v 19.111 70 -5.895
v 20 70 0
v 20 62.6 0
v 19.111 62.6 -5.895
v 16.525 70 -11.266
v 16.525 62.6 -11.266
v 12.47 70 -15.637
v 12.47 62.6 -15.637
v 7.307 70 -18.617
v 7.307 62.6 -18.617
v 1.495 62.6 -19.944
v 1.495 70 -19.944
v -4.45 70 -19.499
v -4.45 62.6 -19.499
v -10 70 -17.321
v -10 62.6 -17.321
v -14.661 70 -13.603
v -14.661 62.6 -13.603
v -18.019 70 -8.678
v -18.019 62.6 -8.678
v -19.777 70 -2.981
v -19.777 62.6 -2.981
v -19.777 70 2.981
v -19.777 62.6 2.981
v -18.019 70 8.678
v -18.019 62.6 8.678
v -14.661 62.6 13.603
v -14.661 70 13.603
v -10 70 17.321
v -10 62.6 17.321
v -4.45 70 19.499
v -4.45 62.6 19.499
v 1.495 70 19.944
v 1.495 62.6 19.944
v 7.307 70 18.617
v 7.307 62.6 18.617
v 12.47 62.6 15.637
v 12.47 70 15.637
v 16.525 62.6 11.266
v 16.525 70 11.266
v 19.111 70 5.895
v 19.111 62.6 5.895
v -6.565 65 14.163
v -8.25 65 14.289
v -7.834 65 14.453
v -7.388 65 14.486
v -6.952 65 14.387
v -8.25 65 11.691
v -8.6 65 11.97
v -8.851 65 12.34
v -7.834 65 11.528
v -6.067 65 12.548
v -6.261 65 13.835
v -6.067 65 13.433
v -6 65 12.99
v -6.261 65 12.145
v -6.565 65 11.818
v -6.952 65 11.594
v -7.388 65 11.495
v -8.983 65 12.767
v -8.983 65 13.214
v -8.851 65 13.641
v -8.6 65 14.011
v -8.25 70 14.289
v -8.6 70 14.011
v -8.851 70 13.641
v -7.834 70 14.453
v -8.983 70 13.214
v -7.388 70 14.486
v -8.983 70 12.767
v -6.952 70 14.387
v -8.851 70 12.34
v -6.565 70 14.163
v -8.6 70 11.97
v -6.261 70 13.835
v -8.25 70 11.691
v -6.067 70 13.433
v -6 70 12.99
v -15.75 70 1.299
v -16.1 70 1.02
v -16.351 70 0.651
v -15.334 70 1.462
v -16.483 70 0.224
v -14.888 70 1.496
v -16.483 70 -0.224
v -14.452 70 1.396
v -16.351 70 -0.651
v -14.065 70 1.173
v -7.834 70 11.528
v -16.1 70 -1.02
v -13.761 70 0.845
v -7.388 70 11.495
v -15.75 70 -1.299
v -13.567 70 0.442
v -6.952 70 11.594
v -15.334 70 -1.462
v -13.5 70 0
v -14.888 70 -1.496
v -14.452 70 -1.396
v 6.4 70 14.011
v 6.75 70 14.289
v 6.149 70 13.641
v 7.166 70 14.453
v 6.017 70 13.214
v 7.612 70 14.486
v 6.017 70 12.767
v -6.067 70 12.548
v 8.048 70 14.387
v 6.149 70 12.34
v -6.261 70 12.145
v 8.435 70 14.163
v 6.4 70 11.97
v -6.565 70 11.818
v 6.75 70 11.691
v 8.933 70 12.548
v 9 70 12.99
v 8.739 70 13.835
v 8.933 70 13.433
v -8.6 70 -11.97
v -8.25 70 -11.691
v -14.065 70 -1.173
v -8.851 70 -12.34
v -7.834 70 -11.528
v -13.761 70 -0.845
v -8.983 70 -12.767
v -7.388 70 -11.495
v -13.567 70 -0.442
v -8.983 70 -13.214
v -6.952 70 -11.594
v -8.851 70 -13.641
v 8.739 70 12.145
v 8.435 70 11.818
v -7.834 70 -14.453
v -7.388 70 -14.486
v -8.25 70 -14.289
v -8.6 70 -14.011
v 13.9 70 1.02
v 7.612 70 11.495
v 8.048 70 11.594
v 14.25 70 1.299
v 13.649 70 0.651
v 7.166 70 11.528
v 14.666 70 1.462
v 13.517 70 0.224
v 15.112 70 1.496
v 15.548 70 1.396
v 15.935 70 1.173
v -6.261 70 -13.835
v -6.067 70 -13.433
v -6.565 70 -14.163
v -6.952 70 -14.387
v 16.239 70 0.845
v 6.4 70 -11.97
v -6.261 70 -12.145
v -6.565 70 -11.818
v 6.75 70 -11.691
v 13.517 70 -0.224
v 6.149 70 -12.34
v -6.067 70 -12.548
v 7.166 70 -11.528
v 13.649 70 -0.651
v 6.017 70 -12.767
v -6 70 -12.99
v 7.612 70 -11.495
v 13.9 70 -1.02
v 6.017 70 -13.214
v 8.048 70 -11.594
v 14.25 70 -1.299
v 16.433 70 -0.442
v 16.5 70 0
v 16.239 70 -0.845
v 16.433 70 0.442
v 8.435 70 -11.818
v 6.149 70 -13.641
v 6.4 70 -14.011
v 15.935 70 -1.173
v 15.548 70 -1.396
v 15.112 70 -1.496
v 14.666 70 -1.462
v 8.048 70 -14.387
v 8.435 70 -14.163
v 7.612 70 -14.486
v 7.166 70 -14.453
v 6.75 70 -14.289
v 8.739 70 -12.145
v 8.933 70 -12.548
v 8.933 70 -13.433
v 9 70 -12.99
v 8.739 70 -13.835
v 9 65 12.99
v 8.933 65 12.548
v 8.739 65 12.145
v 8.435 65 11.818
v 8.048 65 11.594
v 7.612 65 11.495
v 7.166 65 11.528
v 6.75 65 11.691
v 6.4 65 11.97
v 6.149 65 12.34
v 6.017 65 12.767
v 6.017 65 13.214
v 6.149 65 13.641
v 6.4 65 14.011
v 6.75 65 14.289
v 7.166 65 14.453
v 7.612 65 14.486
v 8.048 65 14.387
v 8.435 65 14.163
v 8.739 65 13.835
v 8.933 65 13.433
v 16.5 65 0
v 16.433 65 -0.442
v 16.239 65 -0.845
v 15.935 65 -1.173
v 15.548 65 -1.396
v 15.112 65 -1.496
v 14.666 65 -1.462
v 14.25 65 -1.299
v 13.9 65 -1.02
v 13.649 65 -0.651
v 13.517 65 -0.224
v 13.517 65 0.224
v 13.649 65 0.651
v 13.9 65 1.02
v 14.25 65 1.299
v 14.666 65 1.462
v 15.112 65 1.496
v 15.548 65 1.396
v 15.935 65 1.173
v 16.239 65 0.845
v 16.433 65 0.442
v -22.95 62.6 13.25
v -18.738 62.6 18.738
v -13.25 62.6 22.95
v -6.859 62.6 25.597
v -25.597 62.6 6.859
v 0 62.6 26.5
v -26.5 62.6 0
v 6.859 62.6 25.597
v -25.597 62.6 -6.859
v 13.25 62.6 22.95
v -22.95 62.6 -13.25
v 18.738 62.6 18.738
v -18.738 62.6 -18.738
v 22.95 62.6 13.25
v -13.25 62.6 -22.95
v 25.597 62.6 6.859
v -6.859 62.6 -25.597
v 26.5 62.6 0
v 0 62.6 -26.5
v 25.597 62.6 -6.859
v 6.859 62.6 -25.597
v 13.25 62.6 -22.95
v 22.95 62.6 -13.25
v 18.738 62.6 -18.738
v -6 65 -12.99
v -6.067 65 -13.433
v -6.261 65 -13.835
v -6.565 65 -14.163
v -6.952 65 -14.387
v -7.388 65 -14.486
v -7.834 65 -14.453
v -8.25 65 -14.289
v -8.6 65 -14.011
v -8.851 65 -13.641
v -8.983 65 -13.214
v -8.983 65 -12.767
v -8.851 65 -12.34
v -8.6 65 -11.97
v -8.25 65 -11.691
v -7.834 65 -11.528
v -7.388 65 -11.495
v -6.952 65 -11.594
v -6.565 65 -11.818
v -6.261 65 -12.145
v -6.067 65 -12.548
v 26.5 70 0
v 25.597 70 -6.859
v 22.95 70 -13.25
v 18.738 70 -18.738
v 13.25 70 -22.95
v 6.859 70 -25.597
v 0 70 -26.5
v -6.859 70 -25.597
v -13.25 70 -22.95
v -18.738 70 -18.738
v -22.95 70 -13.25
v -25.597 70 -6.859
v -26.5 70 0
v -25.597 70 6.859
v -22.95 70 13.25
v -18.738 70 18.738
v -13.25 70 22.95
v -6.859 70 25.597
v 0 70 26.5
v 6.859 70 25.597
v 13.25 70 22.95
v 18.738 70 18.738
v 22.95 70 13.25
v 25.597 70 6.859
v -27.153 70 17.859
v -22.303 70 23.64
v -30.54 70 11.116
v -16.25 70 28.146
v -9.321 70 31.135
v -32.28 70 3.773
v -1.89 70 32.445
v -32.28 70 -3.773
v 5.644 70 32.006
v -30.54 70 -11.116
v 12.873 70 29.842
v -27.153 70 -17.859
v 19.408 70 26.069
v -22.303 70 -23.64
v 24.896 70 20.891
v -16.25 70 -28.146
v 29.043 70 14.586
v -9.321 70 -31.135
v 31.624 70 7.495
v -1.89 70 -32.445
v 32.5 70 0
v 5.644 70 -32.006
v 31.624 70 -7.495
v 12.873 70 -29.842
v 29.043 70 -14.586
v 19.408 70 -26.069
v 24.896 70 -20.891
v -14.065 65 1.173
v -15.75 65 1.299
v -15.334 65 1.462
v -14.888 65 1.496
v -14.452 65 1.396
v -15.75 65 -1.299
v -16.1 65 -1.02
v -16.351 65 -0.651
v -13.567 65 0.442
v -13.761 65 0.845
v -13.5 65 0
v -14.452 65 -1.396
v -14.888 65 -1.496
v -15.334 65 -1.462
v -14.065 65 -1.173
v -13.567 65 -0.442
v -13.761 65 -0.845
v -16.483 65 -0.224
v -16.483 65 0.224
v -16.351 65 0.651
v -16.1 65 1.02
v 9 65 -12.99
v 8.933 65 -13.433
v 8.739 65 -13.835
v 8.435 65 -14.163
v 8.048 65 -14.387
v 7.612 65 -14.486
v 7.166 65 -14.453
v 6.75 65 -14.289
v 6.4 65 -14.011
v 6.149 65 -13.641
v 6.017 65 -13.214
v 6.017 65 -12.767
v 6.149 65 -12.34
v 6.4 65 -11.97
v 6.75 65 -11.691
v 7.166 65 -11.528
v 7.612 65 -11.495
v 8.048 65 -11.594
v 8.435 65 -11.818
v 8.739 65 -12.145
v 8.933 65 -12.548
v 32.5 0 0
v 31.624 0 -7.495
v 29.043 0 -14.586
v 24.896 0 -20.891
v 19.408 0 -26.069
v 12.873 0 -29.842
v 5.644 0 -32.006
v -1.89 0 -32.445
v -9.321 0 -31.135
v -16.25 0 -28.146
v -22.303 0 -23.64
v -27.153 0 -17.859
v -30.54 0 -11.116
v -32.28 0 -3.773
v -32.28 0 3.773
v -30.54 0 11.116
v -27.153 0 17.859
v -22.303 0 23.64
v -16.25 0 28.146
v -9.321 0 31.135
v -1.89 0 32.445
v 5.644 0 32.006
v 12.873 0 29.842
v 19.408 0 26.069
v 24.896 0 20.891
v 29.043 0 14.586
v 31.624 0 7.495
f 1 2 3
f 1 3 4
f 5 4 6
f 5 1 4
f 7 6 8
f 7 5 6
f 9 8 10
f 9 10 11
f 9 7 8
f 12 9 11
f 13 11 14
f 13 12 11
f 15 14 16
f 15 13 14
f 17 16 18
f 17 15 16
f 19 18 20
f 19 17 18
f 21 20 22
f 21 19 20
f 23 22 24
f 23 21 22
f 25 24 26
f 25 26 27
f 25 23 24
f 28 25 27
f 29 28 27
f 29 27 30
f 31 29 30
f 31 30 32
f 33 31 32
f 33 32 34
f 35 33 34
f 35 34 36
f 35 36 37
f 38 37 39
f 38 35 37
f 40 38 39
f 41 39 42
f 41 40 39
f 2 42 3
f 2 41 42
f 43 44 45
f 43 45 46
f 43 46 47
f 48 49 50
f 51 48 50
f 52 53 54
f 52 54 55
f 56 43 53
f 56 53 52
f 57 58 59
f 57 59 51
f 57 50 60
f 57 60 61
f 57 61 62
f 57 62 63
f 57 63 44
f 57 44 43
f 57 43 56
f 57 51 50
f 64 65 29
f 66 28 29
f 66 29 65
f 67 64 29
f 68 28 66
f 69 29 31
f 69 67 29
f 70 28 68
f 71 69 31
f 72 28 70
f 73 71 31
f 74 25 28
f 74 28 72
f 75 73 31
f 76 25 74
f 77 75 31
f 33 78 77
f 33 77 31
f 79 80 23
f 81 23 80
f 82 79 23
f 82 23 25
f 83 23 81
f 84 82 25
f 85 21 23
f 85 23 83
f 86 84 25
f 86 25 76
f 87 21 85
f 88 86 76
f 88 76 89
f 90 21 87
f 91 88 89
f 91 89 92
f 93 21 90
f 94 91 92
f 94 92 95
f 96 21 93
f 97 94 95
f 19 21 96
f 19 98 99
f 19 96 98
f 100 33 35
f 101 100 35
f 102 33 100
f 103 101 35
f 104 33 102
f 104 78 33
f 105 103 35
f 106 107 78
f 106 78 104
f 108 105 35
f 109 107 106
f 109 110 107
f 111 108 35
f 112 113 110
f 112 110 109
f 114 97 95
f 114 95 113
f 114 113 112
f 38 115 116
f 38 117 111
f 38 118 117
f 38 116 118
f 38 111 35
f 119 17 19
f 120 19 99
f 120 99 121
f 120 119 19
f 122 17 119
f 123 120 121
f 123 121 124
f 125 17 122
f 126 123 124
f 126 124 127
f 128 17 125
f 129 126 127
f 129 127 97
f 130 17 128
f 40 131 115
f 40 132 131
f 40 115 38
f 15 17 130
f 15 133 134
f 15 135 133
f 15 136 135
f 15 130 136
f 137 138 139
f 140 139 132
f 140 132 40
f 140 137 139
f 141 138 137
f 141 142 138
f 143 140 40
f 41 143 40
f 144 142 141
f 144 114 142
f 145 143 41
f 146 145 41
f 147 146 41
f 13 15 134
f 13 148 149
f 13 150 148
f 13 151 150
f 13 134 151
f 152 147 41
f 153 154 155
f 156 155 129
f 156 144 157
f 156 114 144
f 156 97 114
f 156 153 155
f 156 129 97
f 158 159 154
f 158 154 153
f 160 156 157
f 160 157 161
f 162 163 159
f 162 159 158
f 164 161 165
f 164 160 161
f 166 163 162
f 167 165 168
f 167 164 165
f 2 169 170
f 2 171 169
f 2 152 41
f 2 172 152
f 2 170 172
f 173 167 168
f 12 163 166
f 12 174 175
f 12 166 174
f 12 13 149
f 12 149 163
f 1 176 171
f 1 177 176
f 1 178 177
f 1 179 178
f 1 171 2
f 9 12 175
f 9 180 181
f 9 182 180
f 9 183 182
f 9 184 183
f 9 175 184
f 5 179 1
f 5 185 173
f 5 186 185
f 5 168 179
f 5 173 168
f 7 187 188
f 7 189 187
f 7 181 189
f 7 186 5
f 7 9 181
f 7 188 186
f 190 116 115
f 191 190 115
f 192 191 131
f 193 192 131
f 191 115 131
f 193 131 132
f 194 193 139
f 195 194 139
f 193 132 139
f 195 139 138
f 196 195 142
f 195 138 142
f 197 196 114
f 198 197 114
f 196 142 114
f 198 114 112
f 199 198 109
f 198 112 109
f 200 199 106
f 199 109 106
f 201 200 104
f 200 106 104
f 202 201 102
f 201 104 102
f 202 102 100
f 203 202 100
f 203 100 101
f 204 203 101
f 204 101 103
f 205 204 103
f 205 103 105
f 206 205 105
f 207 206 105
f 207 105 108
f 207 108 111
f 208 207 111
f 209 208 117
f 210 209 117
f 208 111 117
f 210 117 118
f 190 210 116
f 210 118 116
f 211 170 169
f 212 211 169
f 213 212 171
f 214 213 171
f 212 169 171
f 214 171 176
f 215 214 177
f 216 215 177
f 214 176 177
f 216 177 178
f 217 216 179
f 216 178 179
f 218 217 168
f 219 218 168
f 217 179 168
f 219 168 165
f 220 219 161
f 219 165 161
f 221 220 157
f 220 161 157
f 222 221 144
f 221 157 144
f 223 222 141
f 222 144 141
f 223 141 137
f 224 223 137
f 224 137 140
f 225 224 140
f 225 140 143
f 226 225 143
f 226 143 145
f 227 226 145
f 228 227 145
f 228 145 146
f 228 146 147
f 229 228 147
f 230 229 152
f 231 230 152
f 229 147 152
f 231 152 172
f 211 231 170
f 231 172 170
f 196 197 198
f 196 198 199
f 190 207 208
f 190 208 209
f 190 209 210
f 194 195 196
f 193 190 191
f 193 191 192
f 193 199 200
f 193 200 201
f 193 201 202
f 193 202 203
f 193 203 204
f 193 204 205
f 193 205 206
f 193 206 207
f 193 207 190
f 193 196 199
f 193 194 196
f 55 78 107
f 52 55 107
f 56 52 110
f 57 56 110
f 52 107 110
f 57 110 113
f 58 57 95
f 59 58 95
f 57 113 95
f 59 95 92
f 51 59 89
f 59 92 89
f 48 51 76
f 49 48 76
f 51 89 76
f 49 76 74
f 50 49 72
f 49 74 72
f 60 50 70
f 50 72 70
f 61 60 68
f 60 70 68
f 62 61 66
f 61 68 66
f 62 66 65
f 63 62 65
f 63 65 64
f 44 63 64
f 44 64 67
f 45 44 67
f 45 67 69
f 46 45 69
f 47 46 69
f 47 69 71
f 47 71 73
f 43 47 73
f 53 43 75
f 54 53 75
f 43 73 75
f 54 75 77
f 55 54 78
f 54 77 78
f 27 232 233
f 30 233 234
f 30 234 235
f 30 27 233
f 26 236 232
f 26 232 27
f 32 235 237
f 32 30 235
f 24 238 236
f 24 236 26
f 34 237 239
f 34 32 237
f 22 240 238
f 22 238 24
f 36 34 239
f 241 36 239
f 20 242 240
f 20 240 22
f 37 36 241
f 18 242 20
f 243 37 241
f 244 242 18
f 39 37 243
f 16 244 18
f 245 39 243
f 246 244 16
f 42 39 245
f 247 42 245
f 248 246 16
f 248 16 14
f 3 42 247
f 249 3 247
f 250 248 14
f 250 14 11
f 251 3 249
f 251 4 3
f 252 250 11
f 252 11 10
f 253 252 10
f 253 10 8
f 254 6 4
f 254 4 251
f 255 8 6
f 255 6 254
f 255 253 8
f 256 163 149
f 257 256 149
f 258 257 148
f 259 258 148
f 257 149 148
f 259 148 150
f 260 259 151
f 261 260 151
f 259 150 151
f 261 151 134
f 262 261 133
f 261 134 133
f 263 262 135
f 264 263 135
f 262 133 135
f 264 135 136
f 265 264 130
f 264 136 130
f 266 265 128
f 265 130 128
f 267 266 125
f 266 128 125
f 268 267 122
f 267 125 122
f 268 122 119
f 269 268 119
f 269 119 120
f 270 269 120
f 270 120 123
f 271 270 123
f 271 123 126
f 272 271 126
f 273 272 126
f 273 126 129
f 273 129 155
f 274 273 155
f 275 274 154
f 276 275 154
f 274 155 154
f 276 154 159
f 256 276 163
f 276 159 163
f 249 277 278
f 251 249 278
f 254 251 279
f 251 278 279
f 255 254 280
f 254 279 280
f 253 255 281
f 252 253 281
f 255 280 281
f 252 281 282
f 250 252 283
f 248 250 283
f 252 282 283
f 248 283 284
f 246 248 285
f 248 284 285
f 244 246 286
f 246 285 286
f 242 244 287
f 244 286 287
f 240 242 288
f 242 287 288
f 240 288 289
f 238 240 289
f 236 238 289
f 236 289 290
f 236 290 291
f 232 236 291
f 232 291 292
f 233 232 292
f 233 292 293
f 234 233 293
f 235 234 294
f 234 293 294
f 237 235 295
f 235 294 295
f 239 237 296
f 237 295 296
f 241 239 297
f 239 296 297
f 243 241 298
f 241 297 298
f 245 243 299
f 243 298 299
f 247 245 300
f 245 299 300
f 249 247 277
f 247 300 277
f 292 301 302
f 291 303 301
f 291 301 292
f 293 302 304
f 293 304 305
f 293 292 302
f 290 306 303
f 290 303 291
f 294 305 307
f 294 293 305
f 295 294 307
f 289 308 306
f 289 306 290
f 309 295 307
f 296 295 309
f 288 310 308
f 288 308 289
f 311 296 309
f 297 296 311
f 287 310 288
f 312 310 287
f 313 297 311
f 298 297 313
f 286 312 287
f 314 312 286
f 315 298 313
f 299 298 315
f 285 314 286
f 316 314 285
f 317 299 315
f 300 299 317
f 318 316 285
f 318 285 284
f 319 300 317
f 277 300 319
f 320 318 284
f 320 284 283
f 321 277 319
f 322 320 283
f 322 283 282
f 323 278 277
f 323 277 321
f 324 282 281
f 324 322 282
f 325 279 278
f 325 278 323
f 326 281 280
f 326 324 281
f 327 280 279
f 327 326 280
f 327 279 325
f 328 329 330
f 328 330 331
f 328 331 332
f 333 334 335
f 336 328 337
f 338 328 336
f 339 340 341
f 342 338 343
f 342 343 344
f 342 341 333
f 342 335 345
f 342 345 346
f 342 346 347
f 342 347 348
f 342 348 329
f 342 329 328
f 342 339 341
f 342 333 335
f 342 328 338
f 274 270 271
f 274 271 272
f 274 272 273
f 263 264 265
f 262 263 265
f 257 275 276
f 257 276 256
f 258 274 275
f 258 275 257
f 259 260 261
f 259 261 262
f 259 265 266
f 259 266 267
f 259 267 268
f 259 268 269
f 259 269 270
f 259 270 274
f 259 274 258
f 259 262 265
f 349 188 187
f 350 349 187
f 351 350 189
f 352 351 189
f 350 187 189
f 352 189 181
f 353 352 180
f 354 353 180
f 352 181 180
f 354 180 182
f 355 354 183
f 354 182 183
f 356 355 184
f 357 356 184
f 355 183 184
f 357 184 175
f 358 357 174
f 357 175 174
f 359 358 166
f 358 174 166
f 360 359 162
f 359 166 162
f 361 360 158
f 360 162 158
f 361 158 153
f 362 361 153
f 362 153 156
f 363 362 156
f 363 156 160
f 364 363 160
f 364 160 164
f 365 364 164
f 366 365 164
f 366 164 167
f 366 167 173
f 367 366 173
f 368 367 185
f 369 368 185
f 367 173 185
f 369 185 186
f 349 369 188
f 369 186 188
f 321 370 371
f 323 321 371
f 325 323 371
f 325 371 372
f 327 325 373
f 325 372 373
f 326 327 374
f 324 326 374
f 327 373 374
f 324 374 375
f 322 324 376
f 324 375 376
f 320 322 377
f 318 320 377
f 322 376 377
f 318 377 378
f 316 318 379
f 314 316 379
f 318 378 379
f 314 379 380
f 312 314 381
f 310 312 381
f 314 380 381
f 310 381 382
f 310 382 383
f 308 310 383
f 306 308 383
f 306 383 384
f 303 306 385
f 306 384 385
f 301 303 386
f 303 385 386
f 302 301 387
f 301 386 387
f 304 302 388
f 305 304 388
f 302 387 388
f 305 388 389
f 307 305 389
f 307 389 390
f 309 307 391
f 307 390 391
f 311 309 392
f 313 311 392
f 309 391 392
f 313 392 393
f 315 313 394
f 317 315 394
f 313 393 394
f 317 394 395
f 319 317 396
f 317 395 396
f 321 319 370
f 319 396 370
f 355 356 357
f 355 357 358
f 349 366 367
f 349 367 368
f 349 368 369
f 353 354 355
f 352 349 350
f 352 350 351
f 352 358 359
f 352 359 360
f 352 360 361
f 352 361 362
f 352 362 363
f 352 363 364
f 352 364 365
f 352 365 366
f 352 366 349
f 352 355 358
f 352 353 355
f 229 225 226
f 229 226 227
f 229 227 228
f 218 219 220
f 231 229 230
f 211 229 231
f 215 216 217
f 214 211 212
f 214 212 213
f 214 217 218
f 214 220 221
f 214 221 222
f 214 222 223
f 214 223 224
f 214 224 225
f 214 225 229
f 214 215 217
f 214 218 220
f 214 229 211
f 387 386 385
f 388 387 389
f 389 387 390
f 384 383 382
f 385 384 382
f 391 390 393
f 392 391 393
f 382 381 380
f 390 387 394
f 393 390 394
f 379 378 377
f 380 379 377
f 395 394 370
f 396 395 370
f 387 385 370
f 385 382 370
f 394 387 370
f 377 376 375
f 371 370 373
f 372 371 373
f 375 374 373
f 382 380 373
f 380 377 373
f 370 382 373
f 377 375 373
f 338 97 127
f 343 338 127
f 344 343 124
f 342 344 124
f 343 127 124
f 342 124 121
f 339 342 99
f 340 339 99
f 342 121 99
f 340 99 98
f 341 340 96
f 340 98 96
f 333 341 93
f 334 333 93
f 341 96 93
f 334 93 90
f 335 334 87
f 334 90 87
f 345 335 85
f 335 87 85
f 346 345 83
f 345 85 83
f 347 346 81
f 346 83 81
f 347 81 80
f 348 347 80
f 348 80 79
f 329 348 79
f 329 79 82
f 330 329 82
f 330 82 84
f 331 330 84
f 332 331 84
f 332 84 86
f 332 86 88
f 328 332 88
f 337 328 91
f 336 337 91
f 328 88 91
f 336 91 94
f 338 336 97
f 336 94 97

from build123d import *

# Parameters (mm, degrees)
CROQUIS1_R              = 32.5
SALIENTE_EXTRUIR1_DEPTH = 70
CROQUIS2_R              = 1.5
CORTAR_EXTRUIR1_DEPTH   = 5
CROQUIS2_3_R            = 26.5
CROQUIS2_3_R_2          = 20
CORTAR_EXTRUIR2_DEPTH   = 7.4


with BuildPart() as part:
    # Croquis1 → Saliente-Extruir1 (new body)
    with BuildSketch(Plane(origin=(0, 0, 0), x_dir=(1, 0, 0), z_dir=(0, 1, 0))):
        Circle(CROQUIS1_R)
    extrude(amount=SALIENTE_EXTRUIR1_DEPTH)

    # Croquis2 → Cortar-Extruir1 (cut)
    with BuildSketch(Plane(origin=(0, 70, 0), x_dir=(1, 0, 0), z_dir=(0, 1, 0))):
        with Locations((15, 0)):
            Circle(CROQUIS2_R)
        with Locations((7.5, -12.990381057)):
            Circle(CROQUIS2_R)
        with Locations((-7.5, -12.990381057)):
            Circle(CROQUIS2_R)
        with Locations((-15, 0)):
            Circle(CROQUIS2_R)
        with Locations((-7.5, 12.990381057)):
            Circle(CROQUIS2_R)
        with Locations((7.5, 12.990381057)):
            Circle(CROQUIS2_R)
    extrude(amount=-CORTAR_EXTRUIR1_DEPTH, mode=Mode.SUBTRACT)

    # Croquis2<3> → Cortar-Extruir2 (cut)
    with BuildSketch(Plane(origin=(0, 70, 0), x_dir=(1, 0, 0), z_dir=(0, 1, 0))):
        Circle(CROQUIS2_3_R)
        Circle(CROQUIS2_3_R_2, mode=Mode.SUBTRACT)
    extrude(amount=-CORTAR_EXTRUIR2_DEPTH, mode=Mode.SUBTRACT)


solid = part.part
